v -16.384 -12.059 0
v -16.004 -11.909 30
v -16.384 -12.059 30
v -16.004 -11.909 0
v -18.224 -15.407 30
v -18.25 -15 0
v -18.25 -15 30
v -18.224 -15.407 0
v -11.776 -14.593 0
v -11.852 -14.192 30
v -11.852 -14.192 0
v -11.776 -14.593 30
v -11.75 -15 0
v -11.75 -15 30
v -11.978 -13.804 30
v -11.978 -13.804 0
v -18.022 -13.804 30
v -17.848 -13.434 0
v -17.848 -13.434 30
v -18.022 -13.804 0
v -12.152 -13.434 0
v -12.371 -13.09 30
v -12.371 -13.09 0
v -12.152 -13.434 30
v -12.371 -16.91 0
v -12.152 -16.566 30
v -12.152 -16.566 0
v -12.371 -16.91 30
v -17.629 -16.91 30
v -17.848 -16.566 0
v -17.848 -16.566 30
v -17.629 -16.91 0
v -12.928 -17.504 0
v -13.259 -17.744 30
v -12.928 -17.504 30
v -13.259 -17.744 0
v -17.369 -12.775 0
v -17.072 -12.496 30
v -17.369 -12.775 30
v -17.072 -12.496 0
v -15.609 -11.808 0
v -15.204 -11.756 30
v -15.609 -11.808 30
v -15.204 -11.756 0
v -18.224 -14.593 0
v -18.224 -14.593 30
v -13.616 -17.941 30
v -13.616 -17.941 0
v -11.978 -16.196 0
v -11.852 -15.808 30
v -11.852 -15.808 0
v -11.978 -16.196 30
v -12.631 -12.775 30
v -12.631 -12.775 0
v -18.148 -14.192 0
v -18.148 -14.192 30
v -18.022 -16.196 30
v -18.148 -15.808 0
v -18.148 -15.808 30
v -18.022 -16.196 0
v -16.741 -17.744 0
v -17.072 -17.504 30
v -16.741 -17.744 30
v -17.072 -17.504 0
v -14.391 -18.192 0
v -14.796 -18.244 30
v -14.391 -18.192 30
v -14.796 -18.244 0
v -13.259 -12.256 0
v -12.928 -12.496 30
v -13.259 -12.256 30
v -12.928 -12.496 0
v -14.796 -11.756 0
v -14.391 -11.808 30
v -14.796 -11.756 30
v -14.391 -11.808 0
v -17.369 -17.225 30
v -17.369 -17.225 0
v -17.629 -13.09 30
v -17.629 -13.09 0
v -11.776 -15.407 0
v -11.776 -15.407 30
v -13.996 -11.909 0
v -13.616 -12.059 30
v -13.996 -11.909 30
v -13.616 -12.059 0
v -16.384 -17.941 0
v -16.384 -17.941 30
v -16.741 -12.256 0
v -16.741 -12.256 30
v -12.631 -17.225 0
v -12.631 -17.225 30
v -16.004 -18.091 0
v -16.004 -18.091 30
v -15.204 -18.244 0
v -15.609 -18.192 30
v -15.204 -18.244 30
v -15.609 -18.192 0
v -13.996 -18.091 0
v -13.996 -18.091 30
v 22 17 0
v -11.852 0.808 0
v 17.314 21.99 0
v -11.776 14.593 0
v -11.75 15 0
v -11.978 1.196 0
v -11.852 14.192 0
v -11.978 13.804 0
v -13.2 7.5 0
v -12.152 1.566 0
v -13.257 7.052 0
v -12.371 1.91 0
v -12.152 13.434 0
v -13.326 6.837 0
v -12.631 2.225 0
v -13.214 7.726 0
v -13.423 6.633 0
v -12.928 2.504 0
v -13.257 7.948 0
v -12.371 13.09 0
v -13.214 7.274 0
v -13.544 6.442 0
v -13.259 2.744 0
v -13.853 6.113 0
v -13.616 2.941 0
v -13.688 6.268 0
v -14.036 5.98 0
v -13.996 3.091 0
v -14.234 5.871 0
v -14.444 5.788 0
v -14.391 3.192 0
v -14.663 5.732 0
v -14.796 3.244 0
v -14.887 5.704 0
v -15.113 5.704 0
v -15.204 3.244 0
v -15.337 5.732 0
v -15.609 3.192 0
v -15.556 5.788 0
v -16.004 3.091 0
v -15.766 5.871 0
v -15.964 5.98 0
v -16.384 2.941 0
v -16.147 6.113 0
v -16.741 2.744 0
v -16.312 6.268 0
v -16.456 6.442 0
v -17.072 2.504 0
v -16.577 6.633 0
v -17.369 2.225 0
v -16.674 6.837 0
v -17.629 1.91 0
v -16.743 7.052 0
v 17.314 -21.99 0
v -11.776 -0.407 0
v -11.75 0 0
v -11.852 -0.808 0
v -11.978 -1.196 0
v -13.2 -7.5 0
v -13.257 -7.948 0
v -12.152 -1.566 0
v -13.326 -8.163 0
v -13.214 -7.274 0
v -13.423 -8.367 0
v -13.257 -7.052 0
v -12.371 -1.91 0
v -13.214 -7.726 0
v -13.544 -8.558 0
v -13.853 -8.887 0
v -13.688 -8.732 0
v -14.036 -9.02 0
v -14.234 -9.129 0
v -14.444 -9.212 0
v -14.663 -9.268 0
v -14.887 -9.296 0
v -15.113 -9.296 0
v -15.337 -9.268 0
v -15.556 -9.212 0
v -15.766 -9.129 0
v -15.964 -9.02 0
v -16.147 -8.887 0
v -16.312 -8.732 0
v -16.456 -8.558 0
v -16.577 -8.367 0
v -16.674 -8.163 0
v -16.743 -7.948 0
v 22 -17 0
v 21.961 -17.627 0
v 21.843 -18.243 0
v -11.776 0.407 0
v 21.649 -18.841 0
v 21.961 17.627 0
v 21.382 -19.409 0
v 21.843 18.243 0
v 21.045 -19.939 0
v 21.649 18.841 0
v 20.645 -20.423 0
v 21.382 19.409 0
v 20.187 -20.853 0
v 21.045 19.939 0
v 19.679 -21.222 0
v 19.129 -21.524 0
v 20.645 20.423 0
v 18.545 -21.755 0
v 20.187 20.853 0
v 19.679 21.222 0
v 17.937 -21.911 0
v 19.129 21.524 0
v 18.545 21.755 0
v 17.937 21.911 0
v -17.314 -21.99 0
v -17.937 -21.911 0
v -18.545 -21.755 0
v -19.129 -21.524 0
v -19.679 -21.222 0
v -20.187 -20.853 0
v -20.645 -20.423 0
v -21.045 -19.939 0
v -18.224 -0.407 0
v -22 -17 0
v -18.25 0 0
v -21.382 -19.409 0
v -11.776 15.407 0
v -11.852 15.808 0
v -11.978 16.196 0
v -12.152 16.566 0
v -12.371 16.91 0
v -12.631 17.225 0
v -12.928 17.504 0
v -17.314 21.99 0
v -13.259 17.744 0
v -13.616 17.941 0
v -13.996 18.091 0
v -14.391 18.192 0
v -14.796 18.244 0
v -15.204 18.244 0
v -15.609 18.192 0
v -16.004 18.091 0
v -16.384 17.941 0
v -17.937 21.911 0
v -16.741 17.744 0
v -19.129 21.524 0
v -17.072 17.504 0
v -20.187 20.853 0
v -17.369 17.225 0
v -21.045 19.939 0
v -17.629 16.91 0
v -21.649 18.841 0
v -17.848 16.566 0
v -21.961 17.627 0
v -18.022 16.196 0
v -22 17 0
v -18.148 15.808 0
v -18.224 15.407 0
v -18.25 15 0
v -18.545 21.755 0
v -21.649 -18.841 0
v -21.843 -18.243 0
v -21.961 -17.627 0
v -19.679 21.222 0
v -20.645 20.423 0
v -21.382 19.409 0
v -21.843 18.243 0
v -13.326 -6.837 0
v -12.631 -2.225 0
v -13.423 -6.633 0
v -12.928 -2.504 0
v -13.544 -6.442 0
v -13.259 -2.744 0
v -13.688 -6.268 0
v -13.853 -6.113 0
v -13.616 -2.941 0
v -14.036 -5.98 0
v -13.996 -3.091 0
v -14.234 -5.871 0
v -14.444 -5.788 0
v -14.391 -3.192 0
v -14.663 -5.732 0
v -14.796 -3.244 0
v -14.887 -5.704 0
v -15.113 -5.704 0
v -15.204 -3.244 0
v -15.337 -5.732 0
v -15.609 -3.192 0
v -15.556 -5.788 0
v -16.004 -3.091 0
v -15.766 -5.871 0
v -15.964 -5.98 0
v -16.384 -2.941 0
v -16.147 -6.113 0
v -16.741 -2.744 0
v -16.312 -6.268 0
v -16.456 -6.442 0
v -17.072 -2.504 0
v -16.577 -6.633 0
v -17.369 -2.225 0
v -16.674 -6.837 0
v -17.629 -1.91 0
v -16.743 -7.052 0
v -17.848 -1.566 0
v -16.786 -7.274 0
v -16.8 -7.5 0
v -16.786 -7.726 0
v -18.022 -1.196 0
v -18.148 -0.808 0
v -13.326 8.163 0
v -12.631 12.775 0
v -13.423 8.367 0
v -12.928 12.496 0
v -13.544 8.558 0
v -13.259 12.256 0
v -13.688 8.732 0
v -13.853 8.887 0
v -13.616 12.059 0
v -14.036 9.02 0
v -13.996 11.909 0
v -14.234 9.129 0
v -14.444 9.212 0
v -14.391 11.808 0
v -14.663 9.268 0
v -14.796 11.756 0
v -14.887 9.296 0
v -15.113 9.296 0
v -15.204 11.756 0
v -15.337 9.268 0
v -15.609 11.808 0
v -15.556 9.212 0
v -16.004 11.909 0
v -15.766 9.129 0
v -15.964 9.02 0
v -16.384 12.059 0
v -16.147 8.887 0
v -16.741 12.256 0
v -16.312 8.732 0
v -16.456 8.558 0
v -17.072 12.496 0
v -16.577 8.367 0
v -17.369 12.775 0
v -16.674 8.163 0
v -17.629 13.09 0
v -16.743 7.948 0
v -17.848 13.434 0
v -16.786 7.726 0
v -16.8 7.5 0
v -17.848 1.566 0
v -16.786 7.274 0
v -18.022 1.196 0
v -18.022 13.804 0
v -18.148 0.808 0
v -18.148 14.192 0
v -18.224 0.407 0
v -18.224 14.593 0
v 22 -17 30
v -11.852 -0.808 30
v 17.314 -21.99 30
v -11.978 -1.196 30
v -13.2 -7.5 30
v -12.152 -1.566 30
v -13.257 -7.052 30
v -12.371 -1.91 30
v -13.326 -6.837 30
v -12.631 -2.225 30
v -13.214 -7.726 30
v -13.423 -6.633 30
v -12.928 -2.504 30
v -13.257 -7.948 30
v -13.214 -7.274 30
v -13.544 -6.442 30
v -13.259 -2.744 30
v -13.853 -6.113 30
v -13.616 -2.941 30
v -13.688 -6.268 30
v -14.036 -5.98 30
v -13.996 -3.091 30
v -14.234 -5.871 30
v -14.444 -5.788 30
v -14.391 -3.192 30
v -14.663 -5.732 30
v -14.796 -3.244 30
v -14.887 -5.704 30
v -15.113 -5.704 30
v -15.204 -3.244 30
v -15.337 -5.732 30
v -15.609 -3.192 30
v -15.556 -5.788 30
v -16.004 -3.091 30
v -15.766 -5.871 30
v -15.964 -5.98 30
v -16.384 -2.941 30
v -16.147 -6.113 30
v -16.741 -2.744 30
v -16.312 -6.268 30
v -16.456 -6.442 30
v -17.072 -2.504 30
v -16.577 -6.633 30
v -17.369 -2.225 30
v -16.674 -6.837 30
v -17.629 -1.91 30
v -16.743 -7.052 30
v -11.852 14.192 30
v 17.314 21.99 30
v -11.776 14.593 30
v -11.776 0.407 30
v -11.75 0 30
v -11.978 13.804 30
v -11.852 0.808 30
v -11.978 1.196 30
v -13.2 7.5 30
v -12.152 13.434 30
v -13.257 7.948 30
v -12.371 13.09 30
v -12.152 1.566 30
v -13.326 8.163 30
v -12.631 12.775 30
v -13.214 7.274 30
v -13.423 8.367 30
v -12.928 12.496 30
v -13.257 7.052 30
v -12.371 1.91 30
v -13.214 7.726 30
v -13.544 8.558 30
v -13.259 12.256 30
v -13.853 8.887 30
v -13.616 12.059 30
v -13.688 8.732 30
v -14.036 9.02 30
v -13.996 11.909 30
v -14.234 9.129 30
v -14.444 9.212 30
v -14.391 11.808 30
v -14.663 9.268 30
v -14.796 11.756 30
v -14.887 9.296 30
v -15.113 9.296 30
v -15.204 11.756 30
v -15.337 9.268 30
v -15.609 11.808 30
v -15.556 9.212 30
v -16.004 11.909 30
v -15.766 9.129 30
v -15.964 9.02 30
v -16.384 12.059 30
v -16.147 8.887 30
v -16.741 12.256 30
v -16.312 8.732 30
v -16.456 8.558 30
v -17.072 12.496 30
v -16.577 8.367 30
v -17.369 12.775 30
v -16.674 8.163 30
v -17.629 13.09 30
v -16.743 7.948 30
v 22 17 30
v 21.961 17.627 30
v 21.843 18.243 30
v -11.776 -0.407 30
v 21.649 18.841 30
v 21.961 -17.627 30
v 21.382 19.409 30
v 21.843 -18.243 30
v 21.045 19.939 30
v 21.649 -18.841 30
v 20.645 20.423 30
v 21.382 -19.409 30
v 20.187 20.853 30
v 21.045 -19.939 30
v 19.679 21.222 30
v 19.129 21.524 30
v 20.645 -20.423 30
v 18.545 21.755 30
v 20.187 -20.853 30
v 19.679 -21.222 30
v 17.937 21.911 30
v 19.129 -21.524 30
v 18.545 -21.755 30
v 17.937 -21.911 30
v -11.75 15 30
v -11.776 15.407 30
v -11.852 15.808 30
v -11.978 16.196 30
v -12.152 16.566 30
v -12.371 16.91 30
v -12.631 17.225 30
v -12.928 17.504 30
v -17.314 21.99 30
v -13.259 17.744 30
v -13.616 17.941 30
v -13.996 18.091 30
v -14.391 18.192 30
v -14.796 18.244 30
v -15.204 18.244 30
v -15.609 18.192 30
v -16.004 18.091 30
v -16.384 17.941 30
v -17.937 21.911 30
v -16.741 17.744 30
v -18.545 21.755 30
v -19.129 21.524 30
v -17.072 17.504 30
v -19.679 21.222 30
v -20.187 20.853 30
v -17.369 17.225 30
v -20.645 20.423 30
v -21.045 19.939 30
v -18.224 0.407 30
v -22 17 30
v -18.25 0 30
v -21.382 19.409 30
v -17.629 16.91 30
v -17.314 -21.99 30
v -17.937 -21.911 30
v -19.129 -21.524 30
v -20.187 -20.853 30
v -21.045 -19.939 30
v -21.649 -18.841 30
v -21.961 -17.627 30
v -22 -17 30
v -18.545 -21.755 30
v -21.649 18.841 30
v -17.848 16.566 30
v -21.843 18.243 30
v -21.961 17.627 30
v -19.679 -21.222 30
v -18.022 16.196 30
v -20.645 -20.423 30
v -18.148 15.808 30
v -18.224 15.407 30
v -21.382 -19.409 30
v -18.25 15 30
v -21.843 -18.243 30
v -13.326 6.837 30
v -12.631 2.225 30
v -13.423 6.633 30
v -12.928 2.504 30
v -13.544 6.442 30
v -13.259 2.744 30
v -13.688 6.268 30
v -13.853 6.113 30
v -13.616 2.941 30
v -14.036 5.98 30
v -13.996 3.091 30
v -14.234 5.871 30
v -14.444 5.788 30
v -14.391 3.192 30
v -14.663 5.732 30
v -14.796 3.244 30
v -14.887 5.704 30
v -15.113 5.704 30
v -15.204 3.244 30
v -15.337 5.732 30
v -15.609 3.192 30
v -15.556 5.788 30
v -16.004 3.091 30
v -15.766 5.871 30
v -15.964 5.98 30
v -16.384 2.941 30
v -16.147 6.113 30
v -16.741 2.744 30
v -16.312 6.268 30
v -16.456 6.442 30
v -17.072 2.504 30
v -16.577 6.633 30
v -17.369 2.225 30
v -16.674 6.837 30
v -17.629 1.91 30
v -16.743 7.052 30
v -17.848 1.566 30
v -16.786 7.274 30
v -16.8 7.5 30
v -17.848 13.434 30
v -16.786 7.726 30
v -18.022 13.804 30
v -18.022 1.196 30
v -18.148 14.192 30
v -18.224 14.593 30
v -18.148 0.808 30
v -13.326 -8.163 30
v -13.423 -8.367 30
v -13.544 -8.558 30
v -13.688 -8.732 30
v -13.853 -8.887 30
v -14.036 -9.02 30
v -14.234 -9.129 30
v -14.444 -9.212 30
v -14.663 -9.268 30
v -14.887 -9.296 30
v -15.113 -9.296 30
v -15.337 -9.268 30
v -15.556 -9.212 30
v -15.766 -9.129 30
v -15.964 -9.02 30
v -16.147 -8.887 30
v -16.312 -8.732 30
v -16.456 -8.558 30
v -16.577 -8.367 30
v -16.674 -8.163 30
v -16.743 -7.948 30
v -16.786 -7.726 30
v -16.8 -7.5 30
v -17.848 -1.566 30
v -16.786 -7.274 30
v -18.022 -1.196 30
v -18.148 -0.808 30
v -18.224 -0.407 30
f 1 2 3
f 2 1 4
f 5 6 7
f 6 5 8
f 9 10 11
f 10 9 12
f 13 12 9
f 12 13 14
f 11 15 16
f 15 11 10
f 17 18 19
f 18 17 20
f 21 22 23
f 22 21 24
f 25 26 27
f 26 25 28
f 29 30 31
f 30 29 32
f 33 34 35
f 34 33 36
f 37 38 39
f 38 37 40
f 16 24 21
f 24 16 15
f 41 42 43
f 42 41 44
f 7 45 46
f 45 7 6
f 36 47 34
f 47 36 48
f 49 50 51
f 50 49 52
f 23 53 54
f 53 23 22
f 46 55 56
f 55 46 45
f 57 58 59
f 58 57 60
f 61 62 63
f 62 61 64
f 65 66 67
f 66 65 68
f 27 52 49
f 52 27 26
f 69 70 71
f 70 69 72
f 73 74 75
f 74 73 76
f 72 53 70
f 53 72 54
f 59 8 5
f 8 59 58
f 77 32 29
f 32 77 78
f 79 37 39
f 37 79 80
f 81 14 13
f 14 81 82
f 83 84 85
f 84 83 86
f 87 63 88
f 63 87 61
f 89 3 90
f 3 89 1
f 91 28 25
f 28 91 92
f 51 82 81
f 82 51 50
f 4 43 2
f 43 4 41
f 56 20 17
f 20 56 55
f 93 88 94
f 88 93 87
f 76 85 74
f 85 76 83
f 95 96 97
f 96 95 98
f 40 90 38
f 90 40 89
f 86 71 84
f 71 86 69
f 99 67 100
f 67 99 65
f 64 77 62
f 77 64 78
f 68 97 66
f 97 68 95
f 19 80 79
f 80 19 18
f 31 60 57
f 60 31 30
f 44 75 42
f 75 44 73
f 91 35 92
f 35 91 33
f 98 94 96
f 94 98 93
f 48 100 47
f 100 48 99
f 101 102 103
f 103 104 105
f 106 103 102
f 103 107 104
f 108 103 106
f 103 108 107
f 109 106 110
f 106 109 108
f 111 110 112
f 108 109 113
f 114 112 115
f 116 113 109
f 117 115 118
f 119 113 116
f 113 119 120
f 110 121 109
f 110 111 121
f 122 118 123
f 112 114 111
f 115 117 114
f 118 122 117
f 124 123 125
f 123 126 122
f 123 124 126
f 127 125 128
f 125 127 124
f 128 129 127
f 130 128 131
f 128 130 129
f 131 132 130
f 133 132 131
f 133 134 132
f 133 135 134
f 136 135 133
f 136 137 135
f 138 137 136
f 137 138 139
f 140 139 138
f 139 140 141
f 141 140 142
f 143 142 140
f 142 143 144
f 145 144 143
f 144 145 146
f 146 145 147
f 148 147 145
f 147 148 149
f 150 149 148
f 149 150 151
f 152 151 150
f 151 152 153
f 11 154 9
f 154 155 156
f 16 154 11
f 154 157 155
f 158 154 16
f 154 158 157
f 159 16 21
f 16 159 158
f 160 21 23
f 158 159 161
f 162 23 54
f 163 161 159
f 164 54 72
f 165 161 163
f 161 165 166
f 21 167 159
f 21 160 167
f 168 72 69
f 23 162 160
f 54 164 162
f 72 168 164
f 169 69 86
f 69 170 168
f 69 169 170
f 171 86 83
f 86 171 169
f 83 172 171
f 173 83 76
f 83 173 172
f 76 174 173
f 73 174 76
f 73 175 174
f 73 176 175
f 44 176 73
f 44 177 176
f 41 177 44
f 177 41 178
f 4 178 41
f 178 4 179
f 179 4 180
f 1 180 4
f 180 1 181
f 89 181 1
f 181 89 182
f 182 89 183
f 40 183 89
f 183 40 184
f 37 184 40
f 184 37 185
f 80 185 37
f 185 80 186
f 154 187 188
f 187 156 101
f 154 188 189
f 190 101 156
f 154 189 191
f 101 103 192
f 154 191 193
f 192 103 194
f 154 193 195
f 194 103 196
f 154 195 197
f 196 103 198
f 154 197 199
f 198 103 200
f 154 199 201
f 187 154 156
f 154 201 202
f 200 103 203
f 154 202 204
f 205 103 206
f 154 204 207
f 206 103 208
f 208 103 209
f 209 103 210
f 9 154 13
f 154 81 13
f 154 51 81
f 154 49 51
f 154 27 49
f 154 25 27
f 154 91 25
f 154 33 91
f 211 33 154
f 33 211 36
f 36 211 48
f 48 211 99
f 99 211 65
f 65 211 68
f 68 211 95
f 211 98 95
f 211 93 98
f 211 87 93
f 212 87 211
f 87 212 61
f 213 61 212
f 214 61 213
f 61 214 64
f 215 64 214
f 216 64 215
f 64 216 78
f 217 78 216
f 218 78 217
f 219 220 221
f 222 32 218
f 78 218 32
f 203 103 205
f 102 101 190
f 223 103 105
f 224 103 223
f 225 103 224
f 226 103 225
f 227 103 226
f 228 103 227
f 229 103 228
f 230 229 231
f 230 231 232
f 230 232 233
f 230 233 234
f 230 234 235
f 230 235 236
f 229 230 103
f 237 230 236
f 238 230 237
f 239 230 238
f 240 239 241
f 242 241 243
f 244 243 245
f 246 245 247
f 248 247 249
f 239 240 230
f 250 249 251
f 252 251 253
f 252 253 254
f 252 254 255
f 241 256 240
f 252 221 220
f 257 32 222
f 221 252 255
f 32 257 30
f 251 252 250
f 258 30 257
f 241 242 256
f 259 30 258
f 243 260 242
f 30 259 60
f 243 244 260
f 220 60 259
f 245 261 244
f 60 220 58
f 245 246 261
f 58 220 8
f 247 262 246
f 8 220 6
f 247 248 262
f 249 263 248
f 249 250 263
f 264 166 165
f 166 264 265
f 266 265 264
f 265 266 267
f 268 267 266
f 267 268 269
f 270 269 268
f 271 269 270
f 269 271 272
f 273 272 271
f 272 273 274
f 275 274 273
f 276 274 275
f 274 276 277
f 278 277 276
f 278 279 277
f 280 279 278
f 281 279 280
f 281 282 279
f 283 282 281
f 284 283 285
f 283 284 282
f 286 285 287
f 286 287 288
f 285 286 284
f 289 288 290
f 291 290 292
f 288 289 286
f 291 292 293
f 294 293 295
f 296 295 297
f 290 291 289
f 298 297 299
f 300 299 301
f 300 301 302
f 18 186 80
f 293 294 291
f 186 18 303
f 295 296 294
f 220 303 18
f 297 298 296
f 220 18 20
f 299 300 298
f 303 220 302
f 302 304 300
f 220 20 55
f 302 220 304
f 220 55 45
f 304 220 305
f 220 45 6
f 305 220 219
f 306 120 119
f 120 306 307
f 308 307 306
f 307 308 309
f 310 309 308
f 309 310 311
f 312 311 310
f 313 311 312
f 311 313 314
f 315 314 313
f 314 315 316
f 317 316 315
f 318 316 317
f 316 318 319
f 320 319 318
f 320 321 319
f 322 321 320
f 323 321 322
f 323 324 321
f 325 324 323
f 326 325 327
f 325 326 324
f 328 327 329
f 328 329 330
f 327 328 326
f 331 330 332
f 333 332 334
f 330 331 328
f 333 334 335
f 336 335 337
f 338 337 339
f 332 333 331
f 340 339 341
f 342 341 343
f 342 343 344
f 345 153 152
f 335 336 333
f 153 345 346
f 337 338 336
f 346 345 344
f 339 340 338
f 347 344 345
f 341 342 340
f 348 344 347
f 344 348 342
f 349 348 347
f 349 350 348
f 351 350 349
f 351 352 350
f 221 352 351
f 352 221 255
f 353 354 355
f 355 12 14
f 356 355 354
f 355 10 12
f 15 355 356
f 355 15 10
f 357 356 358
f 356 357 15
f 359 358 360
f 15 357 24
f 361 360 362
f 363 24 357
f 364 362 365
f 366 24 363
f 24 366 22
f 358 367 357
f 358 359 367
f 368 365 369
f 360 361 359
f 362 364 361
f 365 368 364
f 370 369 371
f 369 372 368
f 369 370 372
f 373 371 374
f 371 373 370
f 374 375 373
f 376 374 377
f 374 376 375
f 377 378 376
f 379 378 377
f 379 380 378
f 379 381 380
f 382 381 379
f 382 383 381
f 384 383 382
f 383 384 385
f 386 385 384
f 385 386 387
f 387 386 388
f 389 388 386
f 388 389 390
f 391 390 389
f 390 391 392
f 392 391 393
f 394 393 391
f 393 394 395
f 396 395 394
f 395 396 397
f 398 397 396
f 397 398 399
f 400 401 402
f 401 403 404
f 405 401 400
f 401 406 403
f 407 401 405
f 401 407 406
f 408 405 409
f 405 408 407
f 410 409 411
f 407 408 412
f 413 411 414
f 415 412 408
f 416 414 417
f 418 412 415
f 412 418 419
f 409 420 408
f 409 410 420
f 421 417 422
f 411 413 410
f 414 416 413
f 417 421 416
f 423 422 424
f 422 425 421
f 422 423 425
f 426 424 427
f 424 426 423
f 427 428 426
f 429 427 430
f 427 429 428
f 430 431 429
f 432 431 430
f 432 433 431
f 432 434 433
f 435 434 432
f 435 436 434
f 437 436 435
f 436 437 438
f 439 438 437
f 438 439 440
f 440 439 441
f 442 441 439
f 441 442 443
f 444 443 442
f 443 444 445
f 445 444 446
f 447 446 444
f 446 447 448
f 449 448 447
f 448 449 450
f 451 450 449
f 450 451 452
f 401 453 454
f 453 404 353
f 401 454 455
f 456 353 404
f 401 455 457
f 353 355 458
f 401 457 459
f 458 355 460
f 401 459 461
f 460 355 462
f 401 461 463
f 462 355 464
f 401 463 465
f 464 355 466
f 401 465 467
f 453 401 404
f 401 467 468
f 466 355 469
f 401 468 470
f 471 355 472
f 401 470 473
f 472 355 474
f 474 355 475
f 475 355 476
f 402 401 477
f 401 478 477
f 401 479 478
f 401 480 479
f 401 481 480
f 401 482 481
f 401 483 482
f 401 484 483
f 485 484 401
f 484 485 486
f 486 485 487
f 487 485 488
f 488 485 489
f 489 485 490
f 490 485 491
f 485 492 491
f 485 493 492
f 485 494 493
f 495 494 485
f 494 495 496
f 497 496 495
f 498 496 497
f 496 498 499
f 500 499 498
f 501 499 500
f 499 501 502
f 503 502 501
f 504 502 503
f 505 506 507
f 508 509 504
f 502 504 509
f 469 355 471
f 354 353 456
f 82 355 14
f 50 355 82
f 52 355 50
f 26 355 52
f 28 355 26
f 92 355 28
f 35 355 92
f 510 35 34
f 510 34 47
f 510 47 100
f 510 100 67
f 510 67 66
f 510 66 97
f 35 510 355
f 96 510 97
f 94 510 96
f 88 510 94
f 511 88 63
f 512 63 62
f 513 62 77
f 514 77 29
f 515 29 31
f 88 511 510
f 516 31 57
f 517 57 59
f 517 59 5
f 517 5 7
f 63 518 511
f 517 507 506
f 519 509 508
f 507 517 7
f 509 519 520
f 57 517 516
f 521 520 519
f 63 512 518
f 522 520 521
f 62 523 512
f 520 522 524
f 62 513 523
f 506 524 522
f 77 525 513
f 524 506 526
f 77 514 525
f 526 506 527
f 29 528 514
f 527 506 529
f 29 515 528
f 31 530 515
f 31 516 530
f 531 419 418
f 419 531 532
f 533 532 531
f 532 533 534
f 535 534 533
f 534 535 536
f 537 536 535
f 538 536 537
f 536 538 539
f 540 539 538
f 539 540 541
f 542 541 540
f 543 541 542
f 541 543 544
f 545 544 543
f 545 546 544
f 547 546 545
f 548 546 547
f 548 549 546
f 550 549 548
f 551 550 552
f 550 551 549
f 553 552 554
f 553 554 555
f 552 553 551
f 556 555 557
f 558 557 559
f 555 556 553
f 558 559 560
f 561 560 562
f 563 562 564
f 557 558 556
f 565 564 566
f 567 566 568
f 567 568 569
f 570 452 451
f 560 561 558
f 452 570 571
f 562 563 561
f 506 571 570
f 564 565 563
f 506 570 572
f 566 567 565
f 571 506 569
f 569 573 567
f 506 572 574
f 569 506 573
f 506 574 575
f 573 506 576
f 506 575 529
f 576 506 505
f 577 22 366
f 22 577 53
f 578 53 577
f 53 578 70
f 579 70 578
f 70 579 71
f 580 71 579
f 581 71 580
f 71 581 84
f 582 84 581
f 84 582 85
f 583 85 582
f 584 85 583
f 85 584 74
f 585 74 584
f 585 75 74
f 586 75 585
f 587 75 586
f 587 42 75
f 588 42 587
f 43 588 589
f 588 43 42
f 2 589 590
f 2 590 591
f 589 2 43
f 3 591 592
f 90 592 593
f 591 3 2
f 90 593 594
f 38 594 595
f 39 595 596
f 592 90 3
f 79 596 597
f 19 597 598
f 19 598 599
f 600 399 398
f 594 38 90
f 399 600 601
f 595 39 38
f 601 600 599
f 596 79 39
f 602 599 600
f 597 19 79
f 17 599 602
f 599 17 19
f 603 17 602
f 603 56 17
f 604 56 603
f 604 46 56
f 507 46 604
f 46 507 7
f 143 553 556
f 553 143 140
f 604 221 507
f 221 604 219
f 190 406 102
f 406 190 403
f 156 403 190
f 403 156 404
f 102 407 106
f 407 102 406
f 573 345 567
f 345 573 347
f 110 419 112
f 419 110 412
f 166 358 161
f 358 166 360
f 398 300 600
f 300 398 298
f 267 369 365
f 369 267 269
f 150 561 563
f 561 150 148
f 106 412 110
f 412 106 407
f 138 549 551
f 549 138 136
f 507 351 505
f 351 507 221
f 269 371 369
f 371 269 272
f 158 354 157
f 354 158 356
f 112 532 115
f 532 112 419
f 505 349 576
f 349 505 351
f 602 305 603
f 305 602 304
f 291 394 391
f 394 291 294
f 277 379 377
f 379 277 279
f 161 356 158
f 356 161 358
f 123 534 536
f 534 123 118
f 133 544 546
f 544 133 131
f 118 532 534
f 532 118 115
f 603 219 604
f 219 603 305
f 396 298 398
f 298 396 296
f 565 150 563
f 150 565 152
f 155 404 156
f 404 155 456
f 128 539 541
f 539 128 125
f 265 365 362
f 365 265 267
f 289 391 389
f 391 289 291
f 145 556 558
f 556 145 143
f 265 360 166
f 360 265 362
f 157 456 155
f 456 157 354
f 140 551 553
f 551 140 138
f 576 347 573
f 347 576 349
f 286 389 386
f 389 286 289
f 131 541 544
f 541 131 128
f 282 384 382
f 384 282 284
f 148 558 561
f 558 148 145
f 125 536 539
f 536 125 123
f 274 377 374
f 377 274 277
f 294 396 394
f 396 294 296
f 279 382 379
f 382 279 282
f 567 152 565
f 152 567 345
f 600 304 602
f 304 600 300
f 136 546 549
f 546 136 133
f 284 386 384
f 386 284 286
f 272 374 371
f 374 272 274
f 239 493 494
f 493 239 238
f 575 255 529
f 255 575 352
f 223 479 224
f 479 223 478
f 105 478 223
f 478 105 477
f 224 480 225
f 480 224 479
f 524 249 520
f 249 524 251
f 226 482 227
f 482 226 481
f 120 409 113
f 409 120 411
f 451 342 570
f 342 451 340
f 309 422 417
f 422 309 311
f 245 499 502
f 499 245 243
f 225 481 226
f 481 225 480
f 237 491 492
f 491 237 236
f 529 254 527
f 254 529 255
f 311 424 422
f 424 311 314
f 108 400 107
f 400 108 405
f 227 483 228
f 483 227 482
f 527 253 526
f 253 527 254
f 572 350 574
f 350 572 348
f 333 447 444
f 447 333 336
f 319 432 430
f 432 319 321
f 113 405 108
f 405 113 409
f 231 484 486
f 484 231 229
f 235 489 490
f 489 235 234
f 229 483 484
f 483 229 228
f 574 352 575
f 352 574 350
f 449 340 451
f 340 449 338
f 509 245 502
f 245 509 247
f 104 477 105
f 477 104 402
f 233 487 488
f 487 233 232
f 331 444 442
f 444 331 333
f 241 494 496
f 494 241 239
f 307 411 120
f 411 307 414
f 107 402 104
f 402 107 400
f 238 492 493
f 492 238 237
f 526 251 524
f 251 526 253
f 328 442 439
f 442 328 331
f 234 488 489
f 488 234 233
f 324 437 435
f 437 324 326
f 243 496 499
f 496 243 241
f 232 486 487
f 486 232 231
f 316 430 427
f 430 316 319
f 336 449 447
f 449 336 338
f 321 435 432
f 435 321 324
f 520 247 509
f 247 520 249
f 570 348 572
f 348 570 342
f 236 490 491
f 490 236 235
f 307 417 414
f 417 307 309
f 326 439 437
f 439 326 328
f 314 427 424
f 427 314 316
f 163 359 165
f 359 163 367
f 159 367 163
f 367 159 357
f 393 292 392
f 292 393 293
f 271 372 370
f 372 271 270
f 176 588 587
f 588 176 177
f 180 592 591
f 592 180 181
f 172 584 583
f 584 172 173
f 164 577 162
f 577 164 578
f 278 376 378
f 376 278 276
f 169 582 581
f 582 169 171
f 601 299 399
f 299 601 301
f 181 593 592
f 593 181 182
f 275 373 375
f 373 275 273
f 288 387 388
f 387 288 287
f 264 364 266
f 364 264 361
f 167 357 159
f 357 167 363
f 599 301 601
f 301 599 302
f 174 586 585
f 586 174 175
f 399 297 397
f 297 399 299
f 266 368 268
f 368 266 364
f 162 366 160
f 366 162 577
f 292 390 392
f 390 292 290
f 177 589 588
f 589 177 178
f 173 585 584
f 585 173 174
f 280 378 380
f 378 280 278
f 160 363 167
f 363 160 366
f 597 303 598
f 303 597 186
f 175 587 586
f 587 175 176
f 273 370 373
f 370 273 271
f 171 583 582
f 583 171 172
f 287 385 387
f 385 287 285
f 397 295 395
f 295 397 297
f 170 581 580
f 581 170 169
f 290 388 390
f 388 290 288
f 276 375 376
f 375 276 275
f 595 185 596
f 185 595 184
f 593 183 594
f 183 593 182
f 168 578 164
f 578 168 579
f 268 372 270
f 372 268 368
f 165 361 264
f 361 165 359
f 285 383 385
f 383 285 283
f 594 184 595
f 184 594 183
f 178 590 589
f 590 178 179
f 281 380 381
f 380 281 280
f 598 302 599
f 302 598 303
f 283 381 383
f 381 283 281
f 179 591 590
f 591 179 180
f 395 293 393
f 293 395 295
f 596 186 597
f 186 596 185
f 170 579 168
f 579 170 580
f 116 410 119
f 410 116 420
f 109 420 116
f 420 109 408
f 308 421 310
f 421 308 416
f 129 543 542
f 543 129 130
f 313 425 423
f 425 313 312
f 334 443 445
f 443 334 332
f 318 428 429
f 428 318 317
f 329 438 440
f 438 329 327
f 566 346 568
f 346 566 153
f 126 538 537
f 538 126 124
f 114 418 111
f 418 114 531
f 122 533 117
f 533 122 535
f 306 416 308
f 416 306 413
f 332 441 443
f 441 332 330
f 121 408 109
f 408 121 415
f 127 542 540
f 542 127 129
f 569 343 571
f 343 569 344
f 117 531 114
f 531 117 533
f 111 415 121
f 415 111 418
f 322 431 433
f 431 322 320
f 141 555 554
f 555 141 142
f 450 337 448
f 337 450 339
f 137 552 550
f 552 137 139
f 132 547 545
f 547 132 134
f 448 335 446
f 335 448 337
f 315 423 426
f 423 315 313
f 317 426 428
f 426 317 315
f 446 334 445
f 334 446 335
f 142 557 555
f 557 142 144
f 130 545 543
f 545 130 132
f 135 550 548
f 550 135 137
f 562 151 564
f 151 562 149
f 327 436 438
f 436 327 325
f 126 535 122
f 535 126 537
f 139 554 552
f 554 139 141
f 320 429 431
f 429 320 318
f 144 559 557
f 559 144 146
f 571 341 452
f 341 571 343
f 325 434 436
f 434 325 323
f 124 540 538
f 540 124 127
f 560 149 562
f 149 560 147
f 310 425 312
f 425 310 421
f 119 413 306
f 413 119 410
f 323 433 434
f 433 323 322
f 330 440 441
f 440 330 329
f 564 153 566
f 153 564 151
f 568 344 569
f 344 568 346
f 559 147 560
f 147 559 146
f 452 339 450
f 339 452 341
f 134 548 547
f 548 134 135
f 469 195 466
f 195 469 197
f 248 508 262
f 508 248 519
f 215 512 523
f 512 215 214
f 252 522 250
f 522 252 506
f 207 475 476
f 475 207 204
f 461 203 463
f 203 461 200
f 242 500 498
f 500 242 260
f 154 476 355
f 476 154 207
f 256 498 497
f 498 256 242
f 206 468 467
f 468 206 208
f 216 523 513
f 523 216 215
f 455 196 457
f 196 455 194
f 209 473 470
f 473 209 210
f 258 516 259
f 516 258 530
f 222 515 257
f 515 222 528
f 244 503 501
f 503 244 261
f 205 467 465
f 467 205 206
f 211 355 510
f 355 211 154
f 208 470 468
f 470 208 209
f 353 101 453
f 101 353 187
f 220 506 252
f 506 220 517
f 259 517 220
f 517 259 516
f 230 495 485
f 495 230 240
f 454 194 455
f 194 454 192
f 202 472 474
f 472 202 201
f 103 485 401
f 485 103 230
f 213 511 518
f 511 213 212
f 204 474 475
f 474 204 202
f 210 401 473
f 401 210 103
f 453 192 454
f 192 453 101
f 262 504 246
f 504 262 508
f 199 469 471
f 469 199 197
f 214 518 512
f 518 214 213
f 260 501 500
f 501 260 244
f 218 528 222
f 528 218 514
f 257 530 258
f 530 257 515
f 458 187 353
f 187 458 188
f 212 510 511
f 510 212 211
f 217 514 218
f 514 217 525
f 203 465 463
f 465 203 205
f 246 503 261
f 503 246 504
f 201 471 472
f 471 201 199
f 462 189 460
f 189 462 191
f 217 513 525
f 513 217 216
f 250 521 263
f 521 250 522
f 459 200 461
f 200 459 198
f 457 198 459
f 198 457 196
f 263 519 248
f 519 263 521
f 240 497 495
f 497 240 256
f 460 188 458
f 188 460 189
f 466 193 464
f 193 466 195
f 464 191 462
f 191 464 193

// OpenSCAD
$fn = 50;


difference() {
	union() {
		hull() {
			translate(v = [-17.0000000000, 17.0000000000, 0]) {
				cylinder(h = 30, r = 5);
			}
			translate(v = [17.0000000000, 17.0000000000, 0]) {
				cylinder(h = 30, r = 5);
			}
			translate(v = [-17.0000000000, -17.0000000000, 0]) {
				cylinder(h = 30, r = 5);
			}
			translate(v = [17.0000000000, -17.0000000000, 0]) {
				cylinder(h = 30, r = 5);
			}
		}
	}
	union() {
		translate(v = [-15.0000000000, -15.0000000000, 0]) {
			cylinder(h = 30, r = 3.2500000000);
		}
		translate(v = [-15.0000000000, 0.0000000000, 0]) {
			cylinder(h = 30, r = 3.2500000000);
		}
		translate(v = [-15.0000000000, 15.0000000000, 0]) {
			cylinder(h = 30, r = 3.2500000000);
		}
		translate(v = [-15.0000000000, -15.0000000000, 0]) {
			cylinder(h = 30, r = 1.8000000000);
		}
		translate(v = [-15.0000000000, -7.5000000000, 0]) {
			cylinder(h = 30, r = 1.8000000000);
		}
		translate(v = [-15.0000000000, 0.0000000000, 0]) {
			cylinder(h = 30, r = 1.8000000000);
		}
		translate(v = [-15.0000000000, 7.5000000000, 0]) {
			cylinder(h = 30, r = 1.8000000000);
		}
		translate(v = [-15.0000000000, 15.0000000000, 0]) {
			cylinder(h = 30, r = 1.8000000000);
		}
		translate(v = [-15.0000000000, -15.0000000000, 0]) {
			cylinder(h = 30, r = 1.8000000000);
		}
		translate(v = [-15.0000000000, -7.5000000000, 0]) {
			cylinder(h = 30, r = 1.8000000000);
		}
		translate(v = [-15.0000000000, 0.0000000000, 0]) {
			cylinder(h = 30, r = 1.8000000000);
		}
		translate(v = [-15.0000000000, 7.5000000000, 0]) {
			cylinder(h = 30, r = 1.8000000000);
		}
		translate(v = [-15.0000000000, 15.0000000000, 0]) {
			cylinder(h = 30, r = 1.8000000000);
		}
		translate(v = [-15.0000000000, -15.0000000000, 0]) {
			cylinder(h = 30, r = 1.8000000000);
		}
		translate(v = [-15.0000000000, -7.5000000000, 0]) {
			cylinder(h = 30, r = 1.8000000000);
		}
		translate(v = [-15.0000000000, 0.0000000000, 0]) {
			cylinder(h = 30, r = 1.8000000000);
		}
		translate(v = [-15.0000000000, 7.5000000000, 0]) {
			cylinder(h = 30, r = 1.8000000000);
		}
		translate(v = [-15.0000000000, 15.0000000000, 0]) {
			cylinder(h = 30, r = 1.8000000000);
		}
	}
}
